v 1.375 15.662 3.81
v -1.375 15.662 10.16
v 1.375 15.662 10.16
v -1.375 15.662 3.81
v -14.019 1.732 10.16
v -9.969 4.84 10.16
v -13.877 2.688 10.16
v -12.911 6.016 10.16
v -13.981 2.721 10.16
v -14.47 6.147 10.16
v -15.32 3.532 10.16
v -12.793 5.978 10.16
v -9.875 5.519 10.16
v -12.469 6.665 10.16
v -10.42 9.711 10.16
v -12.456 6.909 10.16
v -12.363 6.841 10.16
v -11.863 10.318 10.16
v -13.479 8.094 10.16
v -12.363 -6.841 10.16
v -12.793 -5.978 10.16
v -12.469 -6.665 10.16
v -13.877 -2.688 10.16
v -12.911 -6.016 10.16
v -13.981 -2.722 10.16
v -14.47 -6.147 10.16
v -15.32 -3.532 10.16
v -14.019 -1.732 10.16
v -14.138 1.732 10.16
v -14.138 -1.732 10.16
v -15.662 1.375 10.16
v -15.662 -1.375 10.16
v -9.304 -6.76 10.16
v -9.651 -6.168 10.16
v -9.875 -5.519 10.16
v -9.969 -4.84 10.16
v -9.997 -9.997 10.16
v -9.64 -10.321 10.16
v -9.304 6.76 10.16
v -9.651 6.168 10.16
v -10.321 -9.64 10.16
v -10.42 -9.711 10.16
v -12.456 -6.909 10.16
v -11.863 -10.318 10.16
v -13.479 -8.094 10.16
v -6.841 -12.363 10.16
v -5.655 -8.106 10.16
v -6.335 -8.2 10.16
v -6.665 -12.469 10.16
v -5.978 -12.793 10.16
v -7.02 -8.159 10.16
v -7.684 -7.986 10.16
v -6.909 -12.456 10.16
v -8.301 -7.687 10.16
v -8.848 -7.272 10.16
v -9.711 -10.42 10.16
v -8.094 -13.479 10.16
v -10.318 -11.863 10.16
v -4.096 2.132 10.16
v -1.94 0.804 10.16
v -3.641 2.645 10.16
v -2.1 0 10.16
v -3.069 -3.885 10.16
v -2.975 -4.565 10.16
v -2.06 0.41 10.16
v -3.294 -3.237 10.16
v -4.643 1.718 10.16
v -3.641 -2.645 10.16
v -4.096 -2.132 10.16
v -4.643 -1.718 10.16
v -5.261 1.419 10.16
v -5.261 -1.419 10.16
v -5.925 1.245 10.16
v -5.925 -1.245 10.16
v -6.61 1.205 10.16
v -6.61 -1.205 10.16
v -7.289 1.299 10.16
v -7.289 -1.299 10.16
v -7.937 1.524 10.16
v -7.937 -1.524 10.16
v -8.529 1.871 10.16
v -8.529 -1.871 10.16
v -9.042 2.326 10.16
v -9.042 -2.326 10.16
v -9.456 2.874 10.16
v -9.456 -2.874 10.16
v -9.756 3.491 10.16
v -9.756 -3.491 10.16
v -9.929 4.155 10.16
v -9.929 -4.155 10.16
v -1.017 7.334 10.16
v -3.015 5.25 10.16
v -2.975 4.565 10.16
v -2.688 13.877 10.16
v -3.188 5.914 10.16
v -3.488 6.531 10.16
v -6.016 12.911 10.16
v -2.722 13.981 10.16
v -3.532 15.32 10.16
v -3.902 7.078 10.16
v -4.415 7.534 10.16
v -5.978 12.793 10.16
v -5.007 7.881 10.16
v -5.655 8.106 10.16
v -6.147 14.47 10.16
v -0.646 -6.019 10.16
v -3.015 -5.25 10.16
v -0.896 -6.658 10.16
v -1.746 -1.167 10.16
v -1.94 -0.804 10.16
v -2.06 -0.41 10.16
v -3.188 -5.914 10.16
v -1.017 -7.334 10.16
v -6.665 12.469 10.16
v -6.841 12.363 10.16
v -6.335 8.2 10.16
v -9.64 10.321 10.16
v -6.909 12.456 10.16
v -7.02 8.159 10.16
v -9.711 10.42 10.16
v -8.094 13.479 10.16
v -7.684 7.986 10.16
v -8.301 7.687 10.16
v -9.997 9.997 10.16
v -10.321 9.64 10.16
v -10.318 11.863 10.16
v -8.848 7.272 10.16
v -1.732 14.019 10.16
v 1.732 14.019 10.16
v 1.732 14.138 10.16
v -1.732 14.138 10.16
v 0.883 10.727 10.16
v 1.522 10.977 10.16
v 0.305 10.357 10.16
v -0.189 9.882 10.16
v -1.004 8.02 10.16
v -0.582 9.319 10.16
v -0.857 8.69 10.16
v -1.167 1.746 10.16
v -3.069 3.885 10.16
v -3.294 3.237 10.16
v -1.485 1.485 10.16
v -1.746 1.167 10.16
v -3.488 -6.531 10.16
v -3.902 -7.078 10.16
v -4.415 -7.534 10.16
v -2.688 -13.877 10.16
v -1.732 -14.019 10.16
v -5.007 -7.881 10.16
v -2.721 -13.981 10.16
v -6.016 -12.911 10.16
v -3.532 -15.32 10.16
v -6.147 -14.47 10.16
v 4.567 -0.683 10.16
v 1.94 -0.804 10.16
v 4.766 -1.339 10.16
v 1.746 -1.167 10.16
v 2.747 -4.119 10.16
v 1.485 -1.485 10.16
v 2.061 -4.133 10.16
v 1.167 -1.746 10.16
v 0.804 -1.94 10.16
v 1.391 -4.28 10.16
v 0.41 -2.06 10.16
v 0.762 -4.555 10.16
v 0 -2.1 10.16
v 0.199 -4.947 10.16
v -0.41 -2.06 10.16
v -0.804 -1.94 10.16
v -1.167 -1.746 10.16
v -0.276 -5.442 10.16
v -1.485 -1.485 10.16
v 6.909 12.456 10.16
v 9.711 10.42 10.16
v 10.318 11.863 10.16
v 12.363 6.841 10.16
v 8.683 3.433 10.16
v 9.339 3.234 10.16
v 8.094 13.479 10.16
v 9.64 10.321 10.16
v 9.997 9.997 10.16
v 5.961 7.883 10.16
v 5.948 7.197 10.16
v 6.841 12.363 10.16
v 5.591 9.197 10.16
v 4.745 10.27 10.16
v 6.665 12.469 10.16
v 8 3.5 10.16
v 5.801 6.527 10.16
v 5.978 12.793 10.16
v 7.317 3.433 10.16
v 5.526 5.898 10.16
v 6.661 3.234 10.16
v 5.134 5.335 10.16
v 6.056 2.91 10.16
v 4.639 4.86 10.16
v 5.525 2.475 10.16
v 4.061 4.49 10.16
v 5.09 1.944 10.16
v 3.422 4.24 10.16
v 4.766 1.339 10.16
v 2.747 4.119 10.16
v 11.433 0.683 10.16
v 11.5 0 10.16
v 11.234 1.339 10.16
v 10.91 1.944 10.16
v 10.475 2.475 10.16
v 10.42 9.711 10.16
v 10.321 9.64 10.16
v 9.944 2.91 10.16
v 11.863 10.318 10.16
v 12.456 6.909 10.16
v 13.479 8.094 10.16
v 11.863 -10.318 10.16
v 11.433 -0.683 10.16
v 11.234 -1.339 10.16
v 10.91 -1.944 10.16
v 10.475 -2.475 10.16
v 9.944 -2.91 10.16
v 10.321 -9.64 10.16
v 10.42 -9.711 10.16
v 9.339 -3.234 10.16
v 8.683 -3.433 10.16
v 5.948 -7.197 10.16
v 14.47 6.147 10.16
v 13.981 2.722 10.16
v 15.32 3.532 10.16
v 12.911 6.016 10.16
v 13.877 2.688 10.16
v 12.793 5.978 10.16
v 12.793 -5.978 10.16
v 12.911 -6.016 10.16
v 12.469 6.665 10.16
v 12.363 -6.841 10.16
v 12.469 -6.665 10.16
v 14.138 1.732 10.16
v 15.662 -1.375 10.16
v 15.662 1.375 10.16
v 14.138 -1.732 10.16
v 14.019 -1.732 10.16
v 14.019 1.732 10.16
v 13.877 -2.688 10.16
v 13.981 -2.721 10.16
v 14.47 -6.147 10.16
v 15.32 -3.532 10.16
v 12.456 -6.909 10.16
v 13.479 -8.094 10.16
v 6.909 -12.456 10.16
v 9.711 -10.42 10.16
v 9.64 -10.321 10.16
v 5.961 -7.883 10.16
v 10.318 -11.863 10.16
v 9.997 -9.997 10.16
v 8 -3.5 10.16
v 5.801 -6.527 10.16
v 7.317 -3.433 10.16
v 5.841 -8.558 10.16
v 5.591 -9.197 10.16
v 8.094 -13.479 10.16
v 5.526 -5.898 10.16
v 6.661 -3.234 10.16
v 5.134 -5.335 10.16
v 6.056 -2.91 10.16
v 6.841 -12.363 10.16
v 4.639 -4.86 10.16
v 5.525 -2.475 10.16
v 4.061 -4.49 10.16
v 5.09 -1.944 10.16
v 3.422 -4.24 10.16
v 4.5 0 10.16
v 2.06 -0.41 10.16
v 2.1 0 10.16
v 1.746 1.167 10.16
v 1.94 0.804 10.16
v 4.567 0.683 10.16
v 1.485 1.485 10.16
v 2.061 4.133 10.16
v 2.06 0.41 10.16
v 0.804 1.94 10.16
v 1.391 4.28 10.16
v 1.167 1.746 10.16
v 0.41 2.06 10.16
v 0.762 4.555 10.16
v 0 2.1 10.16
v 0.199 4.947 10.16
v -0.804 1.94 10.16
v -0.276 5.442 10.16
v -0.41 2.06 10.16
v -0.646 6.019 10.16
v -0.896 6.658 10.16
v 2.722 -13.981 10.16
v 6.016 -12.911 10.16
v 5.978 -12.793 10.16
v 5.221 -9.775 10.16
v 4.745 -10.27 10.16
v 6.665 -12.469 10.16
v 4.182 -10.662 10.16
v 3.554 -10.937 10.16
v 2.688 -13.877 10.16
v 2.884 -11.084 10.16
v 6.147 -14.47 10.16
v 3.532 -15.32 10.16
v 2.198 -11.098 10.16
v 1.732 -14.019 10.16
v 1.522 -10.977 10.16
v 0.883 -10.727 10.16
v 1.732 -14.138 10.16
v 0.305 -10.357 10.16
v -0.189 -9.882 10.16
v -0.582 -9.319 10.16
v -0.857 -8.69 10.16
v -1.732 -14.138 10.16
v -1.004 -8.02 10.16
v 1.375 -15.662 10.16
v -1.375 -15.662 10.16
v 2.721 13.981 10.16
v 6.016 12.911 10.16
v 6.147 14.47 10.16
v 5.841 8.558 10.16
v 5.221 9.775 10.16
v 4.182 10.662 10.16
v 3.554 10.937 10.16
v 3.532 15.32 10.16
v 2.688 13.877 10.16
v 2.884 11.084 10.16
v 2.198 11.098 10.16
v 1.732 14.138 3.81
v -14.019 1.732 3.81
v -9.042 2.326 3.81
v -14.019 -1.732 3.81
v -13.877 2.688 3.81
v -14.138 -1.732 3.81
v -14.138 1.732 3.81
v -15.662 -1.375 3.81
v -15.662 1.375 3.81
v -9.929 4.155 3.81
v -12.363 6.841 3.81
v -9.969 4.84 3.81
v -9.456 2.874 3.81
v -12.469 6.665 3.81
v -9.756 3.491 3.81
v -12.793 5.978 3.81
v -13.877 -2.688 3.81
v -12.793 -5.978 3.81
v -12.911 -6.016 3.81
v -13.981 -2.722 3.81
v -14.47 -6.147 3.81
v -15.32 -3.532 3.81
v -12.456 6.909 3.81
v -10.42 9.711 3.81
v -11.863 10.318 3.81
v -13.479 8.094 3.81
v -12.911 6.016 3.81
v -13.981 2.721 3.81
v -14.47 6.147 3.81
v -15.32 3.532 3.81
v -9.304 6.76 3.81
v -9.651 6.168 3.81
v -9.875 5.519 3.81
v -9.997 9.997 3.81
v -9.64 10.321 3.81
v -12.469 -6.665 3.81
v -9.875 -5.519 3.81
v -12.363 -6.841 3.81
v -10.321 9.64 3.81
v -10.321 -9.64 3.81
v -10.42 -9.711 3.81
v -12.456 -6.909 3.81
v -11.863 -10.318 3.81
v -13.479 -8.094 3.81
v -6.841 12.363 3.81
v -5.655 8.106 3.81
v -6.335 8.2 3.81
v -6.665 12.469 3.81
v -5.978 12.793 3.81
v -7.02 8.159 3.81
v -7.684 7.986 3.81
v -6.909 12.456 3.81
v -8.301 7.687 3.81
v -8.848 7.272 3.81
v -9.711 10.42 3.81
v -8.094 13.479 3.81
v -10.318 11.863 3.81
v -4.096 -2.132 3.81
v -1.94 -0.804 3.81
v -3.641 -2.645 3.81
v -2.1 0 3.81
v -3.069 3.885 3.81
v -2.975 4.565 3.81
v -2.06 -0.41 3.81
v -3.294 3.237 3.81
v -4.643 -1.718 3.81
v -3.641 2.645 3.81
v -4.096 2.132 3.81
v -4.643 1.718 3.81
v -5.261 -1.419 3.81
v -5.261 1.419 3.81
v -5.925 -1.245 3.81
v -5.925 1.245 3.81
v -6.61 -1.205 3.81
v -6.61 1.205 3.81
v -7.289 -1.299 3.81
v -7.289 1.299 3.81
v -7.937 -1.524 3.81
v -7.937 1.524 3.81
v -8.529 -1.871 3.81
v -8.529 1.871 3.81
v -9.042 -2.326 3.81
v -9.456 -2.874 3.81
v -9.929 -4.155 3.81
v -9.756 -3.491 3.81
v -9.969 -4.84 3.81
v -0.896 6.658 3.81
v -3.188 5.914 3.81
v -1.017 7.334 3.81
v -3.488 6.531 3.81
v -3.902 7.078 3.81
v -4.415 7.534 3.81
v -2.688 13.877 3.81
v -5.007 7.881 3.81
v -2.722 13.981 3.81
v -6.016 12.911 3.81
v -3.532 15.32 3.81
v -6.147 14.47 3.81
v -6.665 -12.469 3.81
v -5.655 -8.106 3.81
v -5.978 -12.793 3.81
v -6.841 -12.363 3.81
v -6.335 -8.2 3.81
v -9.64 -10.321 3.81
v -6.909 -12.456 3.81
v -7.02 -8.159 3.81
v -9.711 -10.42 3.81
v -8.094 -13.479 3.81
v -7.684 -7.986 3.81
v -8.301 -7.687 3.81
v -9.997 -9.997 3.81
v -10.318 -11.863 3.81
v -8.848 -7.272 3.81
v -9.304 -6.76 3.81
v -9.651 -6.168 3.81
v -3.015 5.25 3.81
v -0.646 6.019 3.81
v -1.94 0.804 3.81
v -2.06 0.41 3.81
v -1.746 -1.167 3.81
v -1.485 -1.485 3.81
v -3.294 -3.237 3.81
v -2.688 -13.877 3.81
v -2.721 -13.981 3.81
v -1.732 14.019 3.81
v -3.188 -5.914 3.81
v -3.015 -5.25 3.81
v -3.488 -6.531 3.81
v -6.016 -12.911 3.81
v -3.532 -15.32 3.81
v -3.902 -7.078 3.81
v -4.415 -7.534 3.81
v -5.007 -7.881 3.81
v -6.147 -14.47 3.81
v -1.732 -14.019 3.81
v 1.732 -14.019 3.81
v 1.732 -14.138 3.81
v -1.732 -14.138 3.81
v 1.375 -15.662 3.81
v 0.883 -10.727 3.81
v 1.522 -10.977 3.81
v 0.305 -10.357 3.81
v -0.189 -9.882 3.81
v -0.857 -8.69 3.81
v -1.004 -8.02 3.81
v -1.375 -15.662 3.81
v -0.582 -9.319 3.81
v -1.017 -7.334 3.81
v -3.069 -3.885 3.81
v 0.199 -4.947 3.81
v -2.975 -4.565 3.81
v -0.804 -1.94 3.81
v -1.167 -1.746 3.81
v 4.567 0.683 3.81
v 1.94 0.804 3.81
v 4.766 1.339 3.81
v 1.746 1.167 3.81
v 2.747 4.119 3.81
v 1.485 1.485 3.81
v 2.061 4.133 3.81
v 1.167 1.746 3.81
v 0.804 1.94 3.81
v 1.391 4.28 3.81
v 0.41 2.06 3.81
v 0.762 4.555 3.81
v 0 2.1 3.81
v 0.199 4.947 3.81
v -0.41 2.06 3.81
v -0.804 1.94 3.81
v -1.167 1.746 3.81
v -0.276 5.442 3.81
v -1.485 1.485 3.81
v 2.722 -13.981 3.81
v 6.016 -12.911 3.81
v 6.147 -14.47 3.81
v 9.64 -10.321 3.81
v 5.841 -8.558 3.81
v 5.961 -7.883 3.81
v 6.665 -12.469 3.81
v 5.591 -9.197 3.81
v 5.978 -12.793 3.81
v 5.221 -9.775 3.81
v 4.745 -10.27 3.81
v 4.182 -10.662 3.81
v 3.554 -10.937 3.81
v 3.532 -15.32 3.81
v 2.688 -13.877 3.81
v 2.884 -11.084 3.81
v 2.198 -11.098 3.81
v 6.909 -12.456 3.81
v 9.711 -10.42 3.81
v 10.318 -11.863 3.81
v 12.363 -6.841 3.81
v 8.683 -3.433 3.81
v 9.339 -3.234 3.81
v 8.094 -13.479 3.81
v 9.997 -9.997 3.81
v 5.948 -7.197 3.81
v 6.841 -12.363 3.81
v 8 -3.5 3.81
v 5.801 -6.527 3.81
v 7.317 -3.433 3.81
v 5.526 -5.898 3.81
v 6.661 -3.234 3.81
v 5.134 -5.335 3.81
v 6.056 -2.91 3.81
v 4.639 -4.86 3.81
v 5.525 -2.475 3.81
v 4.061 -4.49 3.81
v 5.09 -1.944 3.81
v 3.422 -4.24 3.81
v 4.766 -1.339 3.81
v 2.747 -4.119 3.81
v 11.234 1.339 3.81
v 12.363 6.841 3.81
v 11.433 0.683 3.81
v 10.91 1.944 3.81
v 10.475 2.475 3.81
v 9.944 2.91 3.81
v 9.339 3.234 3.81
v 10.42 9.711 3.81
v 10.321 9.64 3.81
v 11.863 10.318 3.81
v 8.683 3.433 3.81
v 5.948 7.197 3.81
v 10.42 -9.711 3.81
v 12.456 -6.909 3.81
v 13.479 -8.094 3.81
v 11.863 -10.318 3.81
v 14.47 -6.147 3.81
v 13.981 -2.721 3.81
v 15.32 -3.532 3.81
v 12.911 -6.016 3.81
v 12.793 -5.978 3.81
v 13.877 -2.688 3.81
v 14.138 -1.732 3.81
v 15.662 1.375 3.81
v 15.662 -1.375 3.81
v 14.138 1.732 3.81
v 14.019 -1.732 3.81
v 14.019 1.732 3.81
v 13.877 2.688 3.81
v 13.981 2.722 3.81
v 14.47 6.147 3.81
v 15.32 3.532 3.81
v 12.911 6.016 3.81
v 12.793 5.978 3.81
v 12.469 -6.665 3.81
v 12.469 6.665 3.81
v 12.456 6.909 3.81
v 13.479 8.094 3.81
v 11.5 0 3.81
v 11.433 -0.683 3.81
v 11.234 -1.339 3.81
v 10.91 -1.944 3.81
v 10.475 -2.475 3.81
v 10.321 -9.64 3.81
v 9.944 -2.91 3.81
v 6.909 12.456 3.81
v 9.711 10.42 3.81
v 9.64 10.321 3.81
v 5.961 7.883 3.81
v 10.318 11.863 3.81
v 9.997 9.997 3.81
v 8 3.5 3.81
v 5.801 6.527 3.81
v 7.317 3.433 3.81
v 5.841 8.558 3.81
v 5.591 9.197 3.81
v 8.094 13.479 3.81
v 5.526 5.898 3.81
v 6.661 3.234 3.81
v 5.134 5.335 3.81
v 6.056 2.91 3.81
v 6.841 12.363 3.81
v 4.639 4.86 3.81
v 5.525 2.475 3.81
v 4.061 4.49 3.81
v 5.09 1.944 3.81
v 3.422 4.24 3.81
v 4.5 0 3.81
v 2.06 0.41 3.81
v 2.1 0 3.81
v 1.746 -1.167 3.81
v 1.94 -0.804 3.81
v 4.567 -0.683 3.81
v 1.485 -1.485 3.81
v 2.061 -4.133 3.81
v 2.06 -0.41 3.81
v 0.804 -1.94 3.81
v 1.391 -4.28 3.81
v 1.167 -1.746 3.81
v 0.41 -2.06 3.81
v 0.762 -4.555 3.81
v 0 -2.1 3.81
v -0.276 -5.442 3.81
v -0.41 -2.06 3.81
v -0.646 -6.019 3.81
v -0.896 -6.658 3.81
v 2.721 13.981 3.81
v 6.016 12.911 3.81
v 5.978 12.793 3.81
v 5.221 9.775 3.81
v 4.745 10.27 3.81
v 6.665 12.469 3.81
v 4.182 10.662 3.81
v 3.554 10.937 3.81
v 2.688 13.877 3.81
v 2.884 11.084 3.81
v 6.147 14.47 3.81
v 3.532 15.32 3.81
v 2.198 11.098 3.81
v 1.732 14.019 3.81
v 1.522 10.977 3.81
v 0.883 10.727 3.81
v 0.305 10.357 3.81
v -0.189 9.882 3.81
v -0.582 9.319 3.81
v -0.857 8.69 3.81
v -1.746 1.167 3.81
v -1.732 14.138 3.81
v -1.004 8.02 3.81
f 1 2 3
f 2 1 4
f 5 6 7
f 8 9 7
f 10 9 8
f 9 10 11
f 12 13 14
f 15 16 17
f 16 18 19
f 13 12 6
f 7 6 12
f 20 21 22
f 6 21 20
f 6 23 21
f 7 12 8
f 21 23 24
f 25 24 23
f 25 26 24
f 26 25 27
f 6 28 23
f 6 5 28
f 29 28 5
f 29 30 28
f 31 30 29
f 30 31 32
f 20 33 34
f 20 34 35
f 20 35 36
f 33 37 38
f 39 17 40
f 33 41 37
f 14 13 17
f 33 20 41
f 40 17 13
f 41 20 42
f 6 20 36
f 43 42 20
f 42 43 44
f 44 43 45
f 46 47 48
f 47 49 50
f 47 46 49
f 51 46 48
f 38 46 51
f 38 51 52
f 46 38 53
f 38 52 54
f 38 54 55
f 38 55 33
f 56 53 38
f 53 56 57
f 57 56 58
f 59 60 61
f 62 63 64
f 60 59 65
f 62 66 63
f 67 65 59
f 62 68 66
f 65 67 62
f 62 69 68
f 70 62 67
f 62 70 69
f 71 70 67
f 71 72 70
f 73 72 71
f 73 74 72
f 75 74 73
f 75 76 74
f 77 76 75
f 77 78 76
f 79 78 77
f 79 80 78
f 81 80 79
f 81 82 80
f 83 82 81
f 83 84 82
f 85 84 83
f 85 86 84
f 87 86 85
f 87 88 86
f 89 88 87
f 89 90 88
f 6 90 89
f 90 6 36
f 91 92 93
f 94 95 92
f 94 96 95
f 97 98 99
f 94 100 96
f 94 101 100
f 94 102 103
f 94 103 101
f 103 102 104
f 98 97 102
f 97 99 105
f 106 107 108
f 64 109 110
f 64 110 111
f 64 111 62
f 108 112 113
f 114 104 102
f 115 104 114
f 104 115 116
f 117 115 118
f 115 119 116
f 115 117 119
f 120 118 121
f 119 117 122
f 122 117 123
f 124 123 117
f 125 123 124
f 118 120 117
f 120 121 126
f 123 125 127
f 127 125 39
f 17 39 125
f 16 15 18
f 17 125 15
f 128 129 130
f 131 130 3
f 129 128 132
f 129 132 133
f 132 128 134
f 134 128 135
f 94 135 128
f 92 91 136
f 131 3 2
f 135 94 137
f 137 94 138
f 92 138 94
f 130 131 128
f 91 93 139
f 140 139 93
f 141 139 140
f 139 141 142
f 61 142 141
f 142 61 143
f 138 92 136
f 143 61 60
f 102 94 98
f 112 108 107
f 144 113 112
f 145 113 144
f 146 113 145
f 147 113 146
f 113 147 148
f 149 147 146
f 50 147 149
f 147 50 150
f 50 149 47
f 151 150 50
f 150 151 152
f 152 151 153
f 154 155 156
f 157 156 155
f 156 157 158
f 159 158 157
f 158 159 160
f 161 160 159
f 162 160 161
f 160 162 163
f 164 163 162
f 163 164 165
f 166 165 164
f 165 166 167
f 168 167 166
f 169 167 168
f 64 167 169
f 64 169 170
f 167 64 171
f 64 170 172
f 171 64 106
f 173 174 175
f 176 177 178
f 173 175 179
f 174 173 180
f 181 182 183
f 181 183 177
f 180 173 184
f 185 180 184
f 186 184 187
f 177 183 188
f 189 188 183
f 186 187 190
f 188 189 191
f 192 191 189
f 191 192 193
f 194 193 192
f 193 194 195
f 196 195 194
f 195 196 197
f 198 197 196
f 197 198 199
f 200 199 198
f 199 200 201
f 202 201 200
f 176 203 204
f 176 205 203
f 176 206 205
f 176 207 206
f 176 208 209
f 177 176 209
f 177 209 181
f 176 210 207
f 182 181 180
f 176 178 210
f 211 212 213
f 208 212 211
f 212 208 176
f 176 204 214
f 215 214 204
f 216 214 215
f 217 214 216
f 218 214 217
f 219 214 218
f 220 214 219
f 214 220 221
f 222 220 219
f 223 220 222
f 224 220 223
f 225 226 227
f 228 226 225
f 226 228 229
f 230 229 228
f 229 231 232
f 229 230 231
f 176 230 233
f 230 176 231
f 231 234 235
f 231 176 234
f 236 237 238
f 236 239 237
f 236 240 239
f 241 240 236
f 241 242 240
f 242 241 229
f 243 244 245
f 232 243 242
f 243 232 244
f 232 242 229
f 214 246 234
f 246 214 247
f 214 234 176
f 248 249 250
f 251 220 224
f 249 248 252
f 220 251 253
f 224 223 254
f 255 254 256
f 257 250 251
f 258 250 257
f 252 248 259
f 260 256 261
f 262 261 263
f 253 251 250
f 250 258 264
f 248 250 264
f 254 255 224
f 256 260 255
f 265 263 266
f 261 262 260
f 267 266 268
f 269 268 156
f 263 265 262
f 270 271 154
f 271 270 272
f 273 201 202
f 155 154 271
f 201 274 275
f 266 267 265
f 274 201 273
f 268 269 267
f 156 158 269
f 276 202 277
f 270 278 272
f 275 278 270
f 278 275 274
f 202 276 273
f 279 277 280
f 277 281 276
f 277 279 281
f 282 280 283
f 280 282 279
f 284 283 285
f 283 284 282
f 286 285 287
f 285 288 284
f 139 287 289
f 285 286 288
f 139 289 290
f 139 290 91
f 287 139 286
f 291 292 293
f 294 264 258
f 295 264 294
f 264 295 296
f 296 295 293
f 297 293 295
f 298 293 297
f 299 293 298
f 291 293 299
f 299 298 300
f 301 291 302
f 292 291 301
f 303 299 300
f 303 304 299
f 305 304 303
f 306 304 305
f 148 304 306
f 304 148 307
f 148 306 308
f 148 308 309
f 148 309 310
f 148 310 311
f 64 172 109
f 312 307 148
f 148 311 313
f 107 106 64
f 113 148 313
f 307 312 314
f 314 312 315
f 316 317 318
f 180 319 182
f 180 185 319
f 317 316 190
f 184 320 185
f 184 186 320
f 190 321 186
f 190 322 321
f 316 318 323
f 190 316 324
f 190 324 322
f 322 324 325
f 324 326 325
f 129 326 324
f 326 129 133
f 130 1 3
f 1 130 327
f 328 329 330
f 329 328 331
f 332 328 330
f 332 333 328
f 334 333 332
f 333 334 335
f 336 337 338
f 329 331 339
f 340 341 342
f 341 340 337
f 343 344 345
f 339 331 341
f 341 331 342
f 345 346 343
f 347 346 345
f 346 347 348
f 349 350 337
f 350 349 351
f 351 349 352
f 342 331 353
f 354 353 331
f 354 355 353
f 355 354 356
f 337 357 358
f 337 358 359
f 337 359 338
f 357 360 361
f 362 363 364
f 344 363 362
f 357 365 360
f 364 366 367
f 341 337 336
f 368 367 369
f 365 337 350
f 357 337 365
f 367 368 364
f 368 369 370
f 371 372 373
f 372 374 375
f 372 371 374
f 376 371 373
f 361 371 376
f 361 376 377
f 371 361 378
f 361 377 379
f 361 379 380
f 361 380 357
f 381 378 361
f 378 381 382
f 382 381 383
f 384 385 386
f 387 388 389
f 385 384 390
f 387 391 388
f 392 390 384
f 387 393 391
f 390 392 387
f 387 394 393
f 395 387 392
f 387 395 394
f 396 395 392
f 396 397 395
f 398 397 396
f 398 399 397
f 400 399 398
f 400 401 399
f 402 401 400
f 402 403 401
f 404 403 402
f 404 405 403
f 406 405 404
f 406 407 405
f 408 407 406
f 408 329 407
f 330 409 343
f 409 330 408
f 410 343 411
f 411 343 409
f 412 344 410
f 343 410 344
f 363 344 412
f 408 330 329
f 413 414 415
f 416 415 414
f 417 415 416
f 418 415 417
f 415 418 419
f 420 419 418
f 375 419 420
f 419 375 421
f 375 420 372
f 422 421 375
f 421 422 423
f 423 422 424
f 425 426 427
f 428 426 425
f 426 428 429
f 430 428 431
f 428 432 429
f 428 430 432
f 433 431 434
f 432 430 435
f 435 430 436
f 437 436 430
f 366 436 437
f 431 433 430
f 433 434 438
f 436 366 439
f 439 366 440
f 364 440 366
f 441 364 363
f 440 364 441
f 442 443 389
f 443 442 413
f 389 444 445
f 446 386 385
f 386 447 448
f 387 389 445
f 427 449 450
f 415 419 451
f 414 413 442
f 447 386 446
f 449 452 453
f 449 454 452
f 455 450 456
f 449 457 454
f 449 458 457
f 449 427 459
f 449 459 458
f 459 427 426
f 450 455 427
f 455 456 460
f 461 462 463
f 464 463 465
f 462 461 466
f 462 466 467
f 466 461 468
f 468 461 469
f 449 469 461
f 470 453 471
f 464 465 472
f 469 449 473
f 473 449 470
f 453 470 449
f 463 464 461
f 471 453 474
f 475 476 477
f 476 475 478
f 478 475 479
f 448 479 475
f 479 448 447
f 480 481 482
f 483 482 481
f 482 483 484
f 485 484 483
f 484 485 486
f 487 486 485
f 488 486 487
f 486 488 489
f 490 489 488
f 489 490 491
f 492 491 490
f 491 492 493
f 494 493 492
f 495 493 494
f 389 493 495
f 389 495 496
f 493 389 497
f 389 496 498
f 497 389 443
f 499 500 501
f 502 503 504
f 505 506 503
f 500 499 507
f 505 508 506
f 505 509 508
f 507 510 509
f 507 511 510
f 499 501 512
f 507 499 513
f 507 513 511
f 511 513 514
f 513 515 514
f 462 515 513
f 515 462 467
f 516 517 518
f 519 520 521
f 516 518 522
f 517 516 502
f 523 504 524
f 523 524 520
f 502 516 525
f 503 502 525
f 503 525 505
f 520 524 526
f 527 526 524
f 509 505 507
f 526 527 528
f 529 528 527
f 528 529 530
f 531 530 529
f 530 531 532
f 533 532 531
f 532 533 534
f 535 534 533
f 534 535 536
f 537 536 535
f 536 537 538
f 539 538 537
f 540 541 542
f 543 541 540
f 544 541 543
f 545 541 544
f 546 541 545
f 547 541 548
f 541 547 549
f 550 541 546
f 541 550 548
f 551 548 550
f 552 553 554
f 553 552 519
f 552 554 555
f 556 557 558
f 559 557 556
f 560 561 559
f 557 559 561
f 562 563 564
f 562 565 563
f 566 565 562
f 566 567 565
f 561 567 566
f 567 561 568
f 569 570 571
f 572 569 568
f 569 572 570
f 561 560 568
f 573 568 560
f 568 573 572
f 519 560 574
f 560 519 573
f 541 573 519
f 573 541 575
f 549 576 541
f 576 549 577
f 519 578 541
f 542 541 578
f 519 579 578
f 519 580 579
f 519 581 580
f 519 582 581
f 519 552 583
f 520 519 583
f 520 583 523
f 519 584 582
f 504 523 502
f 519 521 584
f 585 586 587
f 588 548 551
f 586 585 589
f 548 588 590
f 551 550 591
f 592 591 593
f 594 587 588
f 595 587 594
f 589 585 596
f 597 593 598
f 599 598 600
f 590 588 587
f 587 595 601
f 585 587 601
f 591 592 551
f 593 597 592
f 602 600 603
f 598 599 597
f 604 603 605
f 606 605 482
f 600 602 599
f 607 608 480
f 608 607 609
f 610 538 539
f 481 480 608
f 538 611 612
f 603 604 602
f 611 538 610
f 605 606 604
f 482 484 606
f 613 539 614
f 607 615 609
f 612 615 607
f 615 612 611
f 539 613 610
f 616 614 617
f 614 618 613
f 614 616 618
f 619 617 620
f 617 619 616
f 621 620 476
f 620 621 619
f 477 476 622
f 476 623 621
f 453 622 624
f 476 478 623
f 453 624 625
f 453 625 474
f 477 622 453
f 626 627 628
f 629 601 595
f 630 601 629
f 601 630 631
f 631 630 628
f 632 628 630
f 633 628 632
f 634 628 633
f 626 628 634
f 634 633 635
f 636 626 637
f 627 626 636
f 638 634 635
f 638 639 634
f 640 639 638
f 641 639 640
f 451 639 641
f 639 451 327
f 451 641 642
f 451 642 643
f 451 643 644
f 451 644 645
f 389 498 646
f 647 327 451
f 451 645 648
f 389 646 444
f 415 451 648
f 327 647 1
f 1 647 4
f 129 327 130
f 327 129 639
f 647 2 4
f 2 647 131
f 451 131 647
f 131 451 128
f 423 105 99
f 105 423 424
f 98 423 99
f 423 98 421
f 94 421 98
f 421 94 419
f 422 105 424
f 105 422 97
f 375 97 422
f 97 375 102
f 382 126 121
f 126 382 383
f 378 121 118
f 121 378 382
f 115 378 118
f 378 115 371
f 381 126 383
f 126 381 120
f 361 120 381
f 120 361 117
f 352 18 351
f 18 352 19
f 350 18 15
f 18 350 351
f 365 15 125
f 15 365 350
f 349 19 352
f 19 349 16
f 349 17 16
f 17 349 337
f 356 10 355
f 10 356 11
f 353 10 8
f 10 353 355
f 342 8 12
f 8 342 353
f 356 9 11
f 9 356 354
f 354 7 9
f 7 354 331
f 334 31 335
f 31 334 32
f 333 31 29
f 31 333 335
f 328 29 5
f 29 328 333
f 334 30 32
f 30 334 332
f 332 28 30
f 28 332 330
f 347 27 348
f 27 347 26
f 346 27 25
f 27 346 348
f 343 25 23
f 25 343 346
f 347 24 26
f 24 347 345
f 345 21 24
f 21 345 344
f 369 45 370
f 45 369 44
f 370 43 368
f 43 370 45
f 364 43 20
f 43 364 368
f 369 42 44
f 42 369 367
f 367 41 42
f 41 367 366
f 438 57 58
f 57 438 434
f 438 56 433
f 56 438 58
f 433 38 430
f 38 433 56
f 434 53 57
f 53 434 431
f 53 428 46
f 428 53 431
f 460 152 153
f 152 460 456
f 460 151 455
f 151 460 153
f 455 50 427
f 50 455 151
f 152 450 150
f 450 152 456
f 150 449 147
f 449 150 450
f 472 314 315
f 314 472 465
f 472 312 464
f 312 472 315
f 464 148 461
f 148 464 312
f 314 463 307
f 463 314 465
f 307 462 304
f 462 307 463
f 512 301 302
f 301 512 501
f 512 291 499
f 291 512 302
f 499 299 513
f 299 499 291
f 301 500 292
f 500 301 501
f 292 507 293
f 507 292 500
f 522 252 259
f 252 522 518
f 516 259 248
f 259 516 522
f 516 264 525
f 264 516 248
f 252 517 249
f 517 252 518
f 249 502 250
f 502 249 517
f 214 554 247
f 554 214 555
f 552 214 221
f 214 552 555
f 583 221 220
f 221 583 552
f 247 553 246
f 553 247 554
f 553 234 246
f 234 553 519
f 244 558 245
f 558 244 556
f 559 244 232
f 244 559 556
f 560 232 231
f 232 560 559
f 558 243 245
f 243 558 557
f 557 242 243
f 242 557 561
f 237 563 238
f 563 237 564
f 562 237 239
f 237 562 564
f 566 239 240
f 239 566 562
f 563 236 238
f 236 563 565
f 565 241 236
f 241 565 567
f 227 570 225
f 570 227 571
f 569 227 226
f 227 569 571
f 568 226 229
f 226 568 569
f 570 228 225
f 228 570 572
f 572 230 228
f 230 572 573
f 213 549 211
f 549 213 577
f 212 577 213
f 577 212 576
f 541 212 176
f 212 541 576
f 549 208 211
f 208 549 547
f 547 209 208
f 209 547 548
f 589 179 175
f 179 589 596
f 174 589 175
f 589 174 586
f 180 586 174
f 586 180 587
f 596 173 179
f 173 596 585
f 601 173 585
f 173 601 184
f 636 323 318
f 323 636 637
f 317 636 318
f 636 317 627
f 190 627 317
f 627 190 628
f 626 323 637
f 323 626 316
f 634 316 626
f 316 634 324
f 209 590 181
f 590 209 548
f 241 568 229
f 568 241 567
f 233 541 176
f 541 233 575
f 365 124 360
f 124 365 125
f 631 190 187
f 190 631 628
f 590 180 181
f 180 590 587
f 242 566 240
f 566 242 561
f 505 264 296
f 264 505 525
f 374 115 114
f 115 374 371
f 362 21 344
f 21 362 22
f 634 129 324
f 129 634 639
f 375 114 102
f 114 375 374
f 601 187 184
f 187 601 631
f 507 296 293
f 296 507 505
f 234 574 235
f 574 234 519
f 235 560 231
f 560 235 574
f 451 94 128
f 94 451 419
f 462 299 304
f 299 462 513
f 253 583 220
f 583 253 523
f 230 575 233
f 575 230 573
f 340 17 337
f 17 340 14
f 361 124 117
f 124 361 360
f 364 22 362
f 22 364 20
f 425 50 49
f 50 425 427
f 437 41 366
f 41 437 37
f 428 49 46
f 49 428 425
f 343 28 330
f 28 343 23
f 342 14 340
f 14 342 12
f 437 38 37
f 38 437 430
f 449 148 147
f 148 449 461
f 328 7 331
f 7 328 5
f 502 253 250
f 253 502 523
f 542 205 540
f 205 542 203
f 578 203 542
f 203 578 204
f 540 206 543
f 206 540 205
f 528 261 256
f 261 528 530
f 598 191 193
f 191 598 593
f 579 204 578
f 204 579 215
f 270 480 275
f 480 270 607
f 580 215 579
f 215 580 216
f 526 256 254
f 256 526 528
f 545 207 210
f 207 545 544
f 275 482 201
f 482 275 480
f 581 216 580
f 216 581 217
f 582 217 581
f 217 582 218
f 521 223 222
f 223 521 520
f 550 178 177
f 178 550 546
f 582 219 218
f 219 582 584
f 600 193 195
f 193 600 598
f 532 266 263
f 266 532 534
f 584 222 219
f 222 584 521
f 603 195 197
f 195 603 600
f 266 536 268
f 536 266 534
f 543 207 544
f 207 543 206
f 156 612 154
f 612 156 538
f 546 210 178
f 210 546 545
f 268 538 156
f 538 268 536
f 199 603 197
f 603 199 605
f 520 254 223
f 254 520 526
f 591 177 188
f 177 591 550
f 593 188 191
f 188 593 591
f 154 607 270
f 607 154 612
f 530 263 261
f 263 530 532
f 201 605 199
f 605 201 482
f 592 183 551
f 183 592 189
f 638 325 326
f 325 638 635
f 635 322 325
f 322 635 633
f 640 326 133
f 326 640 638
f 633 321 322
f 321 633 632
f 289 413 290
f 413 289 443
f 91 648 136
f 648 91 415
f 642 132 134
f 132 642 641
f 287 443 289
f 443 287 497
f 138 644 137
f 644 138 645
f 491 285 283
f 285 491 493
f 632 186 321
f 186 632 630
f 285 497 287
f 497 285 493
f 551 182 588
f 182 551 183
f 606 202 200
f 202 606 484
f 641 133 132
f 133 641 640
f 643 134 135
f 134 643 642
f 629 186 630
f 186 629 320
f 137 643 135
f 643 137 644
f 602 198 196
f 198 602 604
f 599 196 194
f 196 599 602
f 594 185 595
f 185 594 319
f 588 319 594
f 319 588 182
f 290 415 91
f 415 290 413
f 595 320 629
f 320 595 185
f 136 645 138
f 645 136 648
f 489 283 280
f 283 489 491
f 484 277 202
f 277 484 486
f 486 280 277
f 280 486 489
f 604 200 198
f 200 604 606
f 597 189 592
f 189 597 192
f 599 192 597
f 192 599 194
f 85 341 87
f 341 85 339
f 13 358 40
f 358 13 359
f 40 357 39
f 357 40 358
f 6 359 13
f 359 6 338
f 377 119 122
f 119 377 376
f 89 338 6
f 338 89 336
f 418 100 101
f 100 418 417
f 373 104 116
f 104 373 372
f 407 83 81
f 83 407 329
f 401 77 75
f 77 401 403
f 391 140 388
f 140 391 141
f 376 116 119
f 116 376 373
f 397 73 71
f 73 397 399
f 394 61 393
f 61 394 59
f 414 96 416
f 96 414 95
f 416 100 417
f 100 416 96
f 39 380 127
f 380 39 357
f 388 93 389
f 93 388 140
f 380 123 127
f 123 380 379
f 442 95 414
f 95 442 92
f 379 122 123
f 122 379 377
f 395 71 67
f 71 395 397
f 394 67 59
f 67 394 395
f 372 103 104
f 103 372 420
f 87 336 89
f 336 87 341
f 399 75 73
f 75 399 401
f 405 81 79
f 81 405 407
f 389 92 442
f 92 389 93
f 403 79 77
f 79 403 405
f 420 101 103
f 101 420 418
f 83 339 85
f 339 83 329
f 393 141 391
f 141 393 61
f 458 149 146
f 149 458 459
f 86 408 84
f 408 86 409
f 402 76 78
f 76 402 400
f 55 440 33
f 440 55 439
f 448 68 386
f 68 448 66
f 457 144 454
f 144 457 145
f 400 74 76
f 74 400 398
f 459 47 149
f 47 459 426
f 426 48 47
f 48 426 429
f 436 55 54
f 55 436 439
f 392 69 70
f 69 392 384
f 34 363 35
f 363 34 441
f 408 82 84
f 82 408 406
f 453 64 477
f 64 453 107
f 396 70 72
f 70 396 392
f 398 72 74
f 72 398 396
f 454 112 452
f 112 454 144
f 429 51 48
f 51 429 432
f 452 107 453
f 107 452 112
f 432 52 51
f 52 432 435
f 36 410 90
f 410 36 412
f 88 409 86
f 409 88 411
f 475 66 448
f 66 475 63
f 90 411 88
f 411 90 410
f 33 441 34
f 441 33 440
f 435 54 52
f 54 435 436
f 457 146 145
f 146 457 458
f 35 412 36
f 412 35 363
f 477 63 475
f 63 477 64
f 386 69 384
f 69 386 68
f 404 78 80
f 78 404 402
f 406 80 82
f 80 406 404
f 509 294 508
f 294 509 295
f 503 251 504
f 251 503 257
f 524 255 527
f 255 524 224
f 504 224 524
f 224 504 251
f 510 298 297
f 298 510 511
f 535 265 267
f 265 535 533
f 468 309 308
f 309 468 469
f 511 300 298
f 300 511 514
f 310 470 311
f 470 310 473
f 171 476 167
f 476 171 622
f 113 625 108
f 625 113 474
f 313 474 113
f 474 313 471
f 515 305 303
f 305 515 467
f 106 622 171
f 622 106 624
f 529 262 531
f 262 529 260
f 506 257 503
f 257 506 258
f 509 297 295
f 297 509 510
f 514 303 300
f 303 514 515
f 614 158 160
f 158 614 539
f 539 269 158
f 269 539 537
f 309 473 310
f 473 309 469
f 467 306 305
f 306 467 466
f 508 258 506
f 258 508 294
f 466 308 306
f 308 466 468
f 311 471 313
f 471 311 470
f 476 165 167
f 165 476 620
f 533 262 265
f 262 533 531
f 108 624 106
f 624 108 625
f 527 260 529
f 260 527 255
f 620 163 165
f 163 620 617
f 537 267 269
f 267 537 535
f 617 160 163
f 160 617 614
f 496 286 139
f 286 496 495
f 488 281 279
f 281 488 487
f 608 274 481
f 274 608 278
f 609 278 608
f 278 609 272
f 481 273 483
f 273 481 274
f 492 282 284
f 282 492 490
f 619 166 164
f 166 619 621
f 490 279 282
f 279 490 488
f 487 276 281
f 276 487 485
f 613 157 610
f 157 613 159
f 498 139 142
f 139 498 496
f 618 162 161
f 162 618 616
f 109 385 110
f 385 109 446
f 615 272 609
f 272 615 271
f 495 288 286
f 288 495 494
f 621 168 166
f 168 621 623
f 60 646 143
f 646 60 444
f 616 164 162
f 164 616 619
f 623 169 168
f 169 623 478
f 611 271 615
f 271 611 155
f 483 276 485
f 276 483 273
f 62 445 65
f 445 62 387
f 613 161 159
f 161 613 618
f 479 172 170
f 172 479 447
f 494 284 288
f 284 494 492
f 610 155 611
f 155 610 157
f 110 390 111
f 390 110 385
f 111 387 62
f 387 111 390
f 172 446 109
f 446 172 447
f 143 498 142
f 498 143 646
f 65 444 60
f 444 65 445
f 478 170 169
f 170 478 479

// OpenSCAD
fudge_ir = -0.01;
fudge_or = 0.0;
fudge_botwd = 0.0;
fudge_topwd = 0.0;

module mxl_pulley (h, nteeth, fancy=true, flange_r=0, flange_angle=45, flange_extrude=0){
	pulley(h=h, nteeth=nteeth, h1=0.02, pitch=0.08, angle=40, toothwd=0.045, fancy=fancy, flange_r=flange_r, flange_angle=flange_angle, flange_extrude=flange_extrude);
}

module xl_pulley (h, nteeth, fancy=true, flange_r=0, flange_angle=45, flange_extrude=0){
	pulley(h=h, nteeth=nteeth, h1=0.05, thick=0.04, pitch=0.2, angle=50, toothwd=0.101, fancy=fancy, flange_r=flange_r, flange_angle=flange_angle, flange_extrude=flange_extrude);
}

module l_pulley (h, nteeth, fancy=true, flange_r=0, flange_angle=45, flange_extrude=0){
	pulley(h=h, nteeth=nteeth, h1=0.075, pitch=0.375, angle=40, toothwd=0.183, fancy=fancy, flange_r=flange_r, flange_angle=flange_angle, flange_extrude=flange_extrude);
}

module h_pulley (h, nteeth, fancy=true, flange_r=0, flange_angle=45, flange_extrude=0){
	pulley(h=h, nteeth=nteeth, h1=0.09, pitch=0.5, angle=40, toothwd=0.241, fancy=fancy, flange_r=flange_r, flange_angle=flange_angle, flange_extrude=flange_extrude);
}

module xh_pulley (h, nteeth, fancy=true, flange_r=0, flange_angle=45, flange_extrude=0){
	pulley (h=h, nteeth=nteeth, h1=0.25, pitch=0.875, angle=40, toothwd=0.495, fancy=fancy, flange_r=flange_r, flange_angle=flange_angle, flange_extrude=flange_extrude);
}
	
module pulley (h, nteeth, h1, thick, pitch, angle, toothwd, fancy, flange_r, flange_angle, flange_extrude){
	flange_ht = flange_r / tan(flange_angle);
	echo(flange_angle);
	echo(flange_r);
	echo(flange_extrude);
	a = pitch - toothwd;
	z_orig = 90 - (angle/2);
	t_orig = a + 2 * h1/tan(z_orig);

	phi = ((fancy==true)? 360.0/nteeth : 0);
	angle = angle - phi/2;
	pr = (nteeth * pitch)/(2*3.1415926);	// pitch radius
	or = pr - thick/2 + fudge_or;			// outer radius
	ir = pr - thick/2 - h1 + fudge_ir;	// inner radius
	z = 90 - (angle/2);
	t = a + 2 * h1/tan(z);
	tdiff = t_orig - t;
	b = a + tdiff;
	for (i=[0:nteeth-1]){
		rotate([0,0,i*(360.0/nteeth)]){
			translate([-t/2,0,flange_ht+flange_extrude]){
				linear_extrude(height=h){
					polygon(points=[[0,0],[0,ir],[(t-b)/2, or], [b + (t-b)/2, or], [t, ir], [t, 0]]);
				}
			}
		}
	}
/*
	cylinder(r=flange_r + r_base + h1, h=flange_extrude, $fn=64);	// lower extrude
	translate([0,0,flange_extrude]){	// lower sloped
		cylinder(r1=flange_r + r_base + h1, r2=r_base + h1, h=flange_ht, $fn=64);
	}
*/

	translate([0,0,flange_ht + flange_extrude]){	// main cylinder
		cylinder(r=ir, h=h, $fn=64);
	}

/*
	translate([0,0,flange_ht+h+flange_extrude]){	// upper sloped
		cylinder(r1=r_base + h1, r2=r_base + flange_r + h1, h=flange_ht, $fn=64);
	}
	translate([0,0,2*flange_ht+h+flange_extrude]){	// upper extrude
		cylinder(r=flange_r + r_base + h1, h=flange_extrude, $fn=64);
	}
*/
}

function tan (theta) = sin(theta)/cos(theta);

//translate([0,0,10]) clyinder (r=7.86/2, h=20, center=true, $fn=6);
nholes=5;
difference (){
	scale(25.4){ xl_pulley(h=0.25, nteeth=20, flange_r=0.1, flange_angle=45, flange_extrude=0.05, fancy=true);
	}

	cylinder(r=2.1, h=100, center=true, $fn=32);
	translate([0,0,16.5]) cylinder(r=4, h=10, center=true, $fn=6);
	for (i=[0:nholes-1]) {
		rotate([0,0,i*(360/nholes)]) {
			translate([8,0,0]) cylinder(r=3.5, h=100, center=true, $fn=32);
		}
	}

}
